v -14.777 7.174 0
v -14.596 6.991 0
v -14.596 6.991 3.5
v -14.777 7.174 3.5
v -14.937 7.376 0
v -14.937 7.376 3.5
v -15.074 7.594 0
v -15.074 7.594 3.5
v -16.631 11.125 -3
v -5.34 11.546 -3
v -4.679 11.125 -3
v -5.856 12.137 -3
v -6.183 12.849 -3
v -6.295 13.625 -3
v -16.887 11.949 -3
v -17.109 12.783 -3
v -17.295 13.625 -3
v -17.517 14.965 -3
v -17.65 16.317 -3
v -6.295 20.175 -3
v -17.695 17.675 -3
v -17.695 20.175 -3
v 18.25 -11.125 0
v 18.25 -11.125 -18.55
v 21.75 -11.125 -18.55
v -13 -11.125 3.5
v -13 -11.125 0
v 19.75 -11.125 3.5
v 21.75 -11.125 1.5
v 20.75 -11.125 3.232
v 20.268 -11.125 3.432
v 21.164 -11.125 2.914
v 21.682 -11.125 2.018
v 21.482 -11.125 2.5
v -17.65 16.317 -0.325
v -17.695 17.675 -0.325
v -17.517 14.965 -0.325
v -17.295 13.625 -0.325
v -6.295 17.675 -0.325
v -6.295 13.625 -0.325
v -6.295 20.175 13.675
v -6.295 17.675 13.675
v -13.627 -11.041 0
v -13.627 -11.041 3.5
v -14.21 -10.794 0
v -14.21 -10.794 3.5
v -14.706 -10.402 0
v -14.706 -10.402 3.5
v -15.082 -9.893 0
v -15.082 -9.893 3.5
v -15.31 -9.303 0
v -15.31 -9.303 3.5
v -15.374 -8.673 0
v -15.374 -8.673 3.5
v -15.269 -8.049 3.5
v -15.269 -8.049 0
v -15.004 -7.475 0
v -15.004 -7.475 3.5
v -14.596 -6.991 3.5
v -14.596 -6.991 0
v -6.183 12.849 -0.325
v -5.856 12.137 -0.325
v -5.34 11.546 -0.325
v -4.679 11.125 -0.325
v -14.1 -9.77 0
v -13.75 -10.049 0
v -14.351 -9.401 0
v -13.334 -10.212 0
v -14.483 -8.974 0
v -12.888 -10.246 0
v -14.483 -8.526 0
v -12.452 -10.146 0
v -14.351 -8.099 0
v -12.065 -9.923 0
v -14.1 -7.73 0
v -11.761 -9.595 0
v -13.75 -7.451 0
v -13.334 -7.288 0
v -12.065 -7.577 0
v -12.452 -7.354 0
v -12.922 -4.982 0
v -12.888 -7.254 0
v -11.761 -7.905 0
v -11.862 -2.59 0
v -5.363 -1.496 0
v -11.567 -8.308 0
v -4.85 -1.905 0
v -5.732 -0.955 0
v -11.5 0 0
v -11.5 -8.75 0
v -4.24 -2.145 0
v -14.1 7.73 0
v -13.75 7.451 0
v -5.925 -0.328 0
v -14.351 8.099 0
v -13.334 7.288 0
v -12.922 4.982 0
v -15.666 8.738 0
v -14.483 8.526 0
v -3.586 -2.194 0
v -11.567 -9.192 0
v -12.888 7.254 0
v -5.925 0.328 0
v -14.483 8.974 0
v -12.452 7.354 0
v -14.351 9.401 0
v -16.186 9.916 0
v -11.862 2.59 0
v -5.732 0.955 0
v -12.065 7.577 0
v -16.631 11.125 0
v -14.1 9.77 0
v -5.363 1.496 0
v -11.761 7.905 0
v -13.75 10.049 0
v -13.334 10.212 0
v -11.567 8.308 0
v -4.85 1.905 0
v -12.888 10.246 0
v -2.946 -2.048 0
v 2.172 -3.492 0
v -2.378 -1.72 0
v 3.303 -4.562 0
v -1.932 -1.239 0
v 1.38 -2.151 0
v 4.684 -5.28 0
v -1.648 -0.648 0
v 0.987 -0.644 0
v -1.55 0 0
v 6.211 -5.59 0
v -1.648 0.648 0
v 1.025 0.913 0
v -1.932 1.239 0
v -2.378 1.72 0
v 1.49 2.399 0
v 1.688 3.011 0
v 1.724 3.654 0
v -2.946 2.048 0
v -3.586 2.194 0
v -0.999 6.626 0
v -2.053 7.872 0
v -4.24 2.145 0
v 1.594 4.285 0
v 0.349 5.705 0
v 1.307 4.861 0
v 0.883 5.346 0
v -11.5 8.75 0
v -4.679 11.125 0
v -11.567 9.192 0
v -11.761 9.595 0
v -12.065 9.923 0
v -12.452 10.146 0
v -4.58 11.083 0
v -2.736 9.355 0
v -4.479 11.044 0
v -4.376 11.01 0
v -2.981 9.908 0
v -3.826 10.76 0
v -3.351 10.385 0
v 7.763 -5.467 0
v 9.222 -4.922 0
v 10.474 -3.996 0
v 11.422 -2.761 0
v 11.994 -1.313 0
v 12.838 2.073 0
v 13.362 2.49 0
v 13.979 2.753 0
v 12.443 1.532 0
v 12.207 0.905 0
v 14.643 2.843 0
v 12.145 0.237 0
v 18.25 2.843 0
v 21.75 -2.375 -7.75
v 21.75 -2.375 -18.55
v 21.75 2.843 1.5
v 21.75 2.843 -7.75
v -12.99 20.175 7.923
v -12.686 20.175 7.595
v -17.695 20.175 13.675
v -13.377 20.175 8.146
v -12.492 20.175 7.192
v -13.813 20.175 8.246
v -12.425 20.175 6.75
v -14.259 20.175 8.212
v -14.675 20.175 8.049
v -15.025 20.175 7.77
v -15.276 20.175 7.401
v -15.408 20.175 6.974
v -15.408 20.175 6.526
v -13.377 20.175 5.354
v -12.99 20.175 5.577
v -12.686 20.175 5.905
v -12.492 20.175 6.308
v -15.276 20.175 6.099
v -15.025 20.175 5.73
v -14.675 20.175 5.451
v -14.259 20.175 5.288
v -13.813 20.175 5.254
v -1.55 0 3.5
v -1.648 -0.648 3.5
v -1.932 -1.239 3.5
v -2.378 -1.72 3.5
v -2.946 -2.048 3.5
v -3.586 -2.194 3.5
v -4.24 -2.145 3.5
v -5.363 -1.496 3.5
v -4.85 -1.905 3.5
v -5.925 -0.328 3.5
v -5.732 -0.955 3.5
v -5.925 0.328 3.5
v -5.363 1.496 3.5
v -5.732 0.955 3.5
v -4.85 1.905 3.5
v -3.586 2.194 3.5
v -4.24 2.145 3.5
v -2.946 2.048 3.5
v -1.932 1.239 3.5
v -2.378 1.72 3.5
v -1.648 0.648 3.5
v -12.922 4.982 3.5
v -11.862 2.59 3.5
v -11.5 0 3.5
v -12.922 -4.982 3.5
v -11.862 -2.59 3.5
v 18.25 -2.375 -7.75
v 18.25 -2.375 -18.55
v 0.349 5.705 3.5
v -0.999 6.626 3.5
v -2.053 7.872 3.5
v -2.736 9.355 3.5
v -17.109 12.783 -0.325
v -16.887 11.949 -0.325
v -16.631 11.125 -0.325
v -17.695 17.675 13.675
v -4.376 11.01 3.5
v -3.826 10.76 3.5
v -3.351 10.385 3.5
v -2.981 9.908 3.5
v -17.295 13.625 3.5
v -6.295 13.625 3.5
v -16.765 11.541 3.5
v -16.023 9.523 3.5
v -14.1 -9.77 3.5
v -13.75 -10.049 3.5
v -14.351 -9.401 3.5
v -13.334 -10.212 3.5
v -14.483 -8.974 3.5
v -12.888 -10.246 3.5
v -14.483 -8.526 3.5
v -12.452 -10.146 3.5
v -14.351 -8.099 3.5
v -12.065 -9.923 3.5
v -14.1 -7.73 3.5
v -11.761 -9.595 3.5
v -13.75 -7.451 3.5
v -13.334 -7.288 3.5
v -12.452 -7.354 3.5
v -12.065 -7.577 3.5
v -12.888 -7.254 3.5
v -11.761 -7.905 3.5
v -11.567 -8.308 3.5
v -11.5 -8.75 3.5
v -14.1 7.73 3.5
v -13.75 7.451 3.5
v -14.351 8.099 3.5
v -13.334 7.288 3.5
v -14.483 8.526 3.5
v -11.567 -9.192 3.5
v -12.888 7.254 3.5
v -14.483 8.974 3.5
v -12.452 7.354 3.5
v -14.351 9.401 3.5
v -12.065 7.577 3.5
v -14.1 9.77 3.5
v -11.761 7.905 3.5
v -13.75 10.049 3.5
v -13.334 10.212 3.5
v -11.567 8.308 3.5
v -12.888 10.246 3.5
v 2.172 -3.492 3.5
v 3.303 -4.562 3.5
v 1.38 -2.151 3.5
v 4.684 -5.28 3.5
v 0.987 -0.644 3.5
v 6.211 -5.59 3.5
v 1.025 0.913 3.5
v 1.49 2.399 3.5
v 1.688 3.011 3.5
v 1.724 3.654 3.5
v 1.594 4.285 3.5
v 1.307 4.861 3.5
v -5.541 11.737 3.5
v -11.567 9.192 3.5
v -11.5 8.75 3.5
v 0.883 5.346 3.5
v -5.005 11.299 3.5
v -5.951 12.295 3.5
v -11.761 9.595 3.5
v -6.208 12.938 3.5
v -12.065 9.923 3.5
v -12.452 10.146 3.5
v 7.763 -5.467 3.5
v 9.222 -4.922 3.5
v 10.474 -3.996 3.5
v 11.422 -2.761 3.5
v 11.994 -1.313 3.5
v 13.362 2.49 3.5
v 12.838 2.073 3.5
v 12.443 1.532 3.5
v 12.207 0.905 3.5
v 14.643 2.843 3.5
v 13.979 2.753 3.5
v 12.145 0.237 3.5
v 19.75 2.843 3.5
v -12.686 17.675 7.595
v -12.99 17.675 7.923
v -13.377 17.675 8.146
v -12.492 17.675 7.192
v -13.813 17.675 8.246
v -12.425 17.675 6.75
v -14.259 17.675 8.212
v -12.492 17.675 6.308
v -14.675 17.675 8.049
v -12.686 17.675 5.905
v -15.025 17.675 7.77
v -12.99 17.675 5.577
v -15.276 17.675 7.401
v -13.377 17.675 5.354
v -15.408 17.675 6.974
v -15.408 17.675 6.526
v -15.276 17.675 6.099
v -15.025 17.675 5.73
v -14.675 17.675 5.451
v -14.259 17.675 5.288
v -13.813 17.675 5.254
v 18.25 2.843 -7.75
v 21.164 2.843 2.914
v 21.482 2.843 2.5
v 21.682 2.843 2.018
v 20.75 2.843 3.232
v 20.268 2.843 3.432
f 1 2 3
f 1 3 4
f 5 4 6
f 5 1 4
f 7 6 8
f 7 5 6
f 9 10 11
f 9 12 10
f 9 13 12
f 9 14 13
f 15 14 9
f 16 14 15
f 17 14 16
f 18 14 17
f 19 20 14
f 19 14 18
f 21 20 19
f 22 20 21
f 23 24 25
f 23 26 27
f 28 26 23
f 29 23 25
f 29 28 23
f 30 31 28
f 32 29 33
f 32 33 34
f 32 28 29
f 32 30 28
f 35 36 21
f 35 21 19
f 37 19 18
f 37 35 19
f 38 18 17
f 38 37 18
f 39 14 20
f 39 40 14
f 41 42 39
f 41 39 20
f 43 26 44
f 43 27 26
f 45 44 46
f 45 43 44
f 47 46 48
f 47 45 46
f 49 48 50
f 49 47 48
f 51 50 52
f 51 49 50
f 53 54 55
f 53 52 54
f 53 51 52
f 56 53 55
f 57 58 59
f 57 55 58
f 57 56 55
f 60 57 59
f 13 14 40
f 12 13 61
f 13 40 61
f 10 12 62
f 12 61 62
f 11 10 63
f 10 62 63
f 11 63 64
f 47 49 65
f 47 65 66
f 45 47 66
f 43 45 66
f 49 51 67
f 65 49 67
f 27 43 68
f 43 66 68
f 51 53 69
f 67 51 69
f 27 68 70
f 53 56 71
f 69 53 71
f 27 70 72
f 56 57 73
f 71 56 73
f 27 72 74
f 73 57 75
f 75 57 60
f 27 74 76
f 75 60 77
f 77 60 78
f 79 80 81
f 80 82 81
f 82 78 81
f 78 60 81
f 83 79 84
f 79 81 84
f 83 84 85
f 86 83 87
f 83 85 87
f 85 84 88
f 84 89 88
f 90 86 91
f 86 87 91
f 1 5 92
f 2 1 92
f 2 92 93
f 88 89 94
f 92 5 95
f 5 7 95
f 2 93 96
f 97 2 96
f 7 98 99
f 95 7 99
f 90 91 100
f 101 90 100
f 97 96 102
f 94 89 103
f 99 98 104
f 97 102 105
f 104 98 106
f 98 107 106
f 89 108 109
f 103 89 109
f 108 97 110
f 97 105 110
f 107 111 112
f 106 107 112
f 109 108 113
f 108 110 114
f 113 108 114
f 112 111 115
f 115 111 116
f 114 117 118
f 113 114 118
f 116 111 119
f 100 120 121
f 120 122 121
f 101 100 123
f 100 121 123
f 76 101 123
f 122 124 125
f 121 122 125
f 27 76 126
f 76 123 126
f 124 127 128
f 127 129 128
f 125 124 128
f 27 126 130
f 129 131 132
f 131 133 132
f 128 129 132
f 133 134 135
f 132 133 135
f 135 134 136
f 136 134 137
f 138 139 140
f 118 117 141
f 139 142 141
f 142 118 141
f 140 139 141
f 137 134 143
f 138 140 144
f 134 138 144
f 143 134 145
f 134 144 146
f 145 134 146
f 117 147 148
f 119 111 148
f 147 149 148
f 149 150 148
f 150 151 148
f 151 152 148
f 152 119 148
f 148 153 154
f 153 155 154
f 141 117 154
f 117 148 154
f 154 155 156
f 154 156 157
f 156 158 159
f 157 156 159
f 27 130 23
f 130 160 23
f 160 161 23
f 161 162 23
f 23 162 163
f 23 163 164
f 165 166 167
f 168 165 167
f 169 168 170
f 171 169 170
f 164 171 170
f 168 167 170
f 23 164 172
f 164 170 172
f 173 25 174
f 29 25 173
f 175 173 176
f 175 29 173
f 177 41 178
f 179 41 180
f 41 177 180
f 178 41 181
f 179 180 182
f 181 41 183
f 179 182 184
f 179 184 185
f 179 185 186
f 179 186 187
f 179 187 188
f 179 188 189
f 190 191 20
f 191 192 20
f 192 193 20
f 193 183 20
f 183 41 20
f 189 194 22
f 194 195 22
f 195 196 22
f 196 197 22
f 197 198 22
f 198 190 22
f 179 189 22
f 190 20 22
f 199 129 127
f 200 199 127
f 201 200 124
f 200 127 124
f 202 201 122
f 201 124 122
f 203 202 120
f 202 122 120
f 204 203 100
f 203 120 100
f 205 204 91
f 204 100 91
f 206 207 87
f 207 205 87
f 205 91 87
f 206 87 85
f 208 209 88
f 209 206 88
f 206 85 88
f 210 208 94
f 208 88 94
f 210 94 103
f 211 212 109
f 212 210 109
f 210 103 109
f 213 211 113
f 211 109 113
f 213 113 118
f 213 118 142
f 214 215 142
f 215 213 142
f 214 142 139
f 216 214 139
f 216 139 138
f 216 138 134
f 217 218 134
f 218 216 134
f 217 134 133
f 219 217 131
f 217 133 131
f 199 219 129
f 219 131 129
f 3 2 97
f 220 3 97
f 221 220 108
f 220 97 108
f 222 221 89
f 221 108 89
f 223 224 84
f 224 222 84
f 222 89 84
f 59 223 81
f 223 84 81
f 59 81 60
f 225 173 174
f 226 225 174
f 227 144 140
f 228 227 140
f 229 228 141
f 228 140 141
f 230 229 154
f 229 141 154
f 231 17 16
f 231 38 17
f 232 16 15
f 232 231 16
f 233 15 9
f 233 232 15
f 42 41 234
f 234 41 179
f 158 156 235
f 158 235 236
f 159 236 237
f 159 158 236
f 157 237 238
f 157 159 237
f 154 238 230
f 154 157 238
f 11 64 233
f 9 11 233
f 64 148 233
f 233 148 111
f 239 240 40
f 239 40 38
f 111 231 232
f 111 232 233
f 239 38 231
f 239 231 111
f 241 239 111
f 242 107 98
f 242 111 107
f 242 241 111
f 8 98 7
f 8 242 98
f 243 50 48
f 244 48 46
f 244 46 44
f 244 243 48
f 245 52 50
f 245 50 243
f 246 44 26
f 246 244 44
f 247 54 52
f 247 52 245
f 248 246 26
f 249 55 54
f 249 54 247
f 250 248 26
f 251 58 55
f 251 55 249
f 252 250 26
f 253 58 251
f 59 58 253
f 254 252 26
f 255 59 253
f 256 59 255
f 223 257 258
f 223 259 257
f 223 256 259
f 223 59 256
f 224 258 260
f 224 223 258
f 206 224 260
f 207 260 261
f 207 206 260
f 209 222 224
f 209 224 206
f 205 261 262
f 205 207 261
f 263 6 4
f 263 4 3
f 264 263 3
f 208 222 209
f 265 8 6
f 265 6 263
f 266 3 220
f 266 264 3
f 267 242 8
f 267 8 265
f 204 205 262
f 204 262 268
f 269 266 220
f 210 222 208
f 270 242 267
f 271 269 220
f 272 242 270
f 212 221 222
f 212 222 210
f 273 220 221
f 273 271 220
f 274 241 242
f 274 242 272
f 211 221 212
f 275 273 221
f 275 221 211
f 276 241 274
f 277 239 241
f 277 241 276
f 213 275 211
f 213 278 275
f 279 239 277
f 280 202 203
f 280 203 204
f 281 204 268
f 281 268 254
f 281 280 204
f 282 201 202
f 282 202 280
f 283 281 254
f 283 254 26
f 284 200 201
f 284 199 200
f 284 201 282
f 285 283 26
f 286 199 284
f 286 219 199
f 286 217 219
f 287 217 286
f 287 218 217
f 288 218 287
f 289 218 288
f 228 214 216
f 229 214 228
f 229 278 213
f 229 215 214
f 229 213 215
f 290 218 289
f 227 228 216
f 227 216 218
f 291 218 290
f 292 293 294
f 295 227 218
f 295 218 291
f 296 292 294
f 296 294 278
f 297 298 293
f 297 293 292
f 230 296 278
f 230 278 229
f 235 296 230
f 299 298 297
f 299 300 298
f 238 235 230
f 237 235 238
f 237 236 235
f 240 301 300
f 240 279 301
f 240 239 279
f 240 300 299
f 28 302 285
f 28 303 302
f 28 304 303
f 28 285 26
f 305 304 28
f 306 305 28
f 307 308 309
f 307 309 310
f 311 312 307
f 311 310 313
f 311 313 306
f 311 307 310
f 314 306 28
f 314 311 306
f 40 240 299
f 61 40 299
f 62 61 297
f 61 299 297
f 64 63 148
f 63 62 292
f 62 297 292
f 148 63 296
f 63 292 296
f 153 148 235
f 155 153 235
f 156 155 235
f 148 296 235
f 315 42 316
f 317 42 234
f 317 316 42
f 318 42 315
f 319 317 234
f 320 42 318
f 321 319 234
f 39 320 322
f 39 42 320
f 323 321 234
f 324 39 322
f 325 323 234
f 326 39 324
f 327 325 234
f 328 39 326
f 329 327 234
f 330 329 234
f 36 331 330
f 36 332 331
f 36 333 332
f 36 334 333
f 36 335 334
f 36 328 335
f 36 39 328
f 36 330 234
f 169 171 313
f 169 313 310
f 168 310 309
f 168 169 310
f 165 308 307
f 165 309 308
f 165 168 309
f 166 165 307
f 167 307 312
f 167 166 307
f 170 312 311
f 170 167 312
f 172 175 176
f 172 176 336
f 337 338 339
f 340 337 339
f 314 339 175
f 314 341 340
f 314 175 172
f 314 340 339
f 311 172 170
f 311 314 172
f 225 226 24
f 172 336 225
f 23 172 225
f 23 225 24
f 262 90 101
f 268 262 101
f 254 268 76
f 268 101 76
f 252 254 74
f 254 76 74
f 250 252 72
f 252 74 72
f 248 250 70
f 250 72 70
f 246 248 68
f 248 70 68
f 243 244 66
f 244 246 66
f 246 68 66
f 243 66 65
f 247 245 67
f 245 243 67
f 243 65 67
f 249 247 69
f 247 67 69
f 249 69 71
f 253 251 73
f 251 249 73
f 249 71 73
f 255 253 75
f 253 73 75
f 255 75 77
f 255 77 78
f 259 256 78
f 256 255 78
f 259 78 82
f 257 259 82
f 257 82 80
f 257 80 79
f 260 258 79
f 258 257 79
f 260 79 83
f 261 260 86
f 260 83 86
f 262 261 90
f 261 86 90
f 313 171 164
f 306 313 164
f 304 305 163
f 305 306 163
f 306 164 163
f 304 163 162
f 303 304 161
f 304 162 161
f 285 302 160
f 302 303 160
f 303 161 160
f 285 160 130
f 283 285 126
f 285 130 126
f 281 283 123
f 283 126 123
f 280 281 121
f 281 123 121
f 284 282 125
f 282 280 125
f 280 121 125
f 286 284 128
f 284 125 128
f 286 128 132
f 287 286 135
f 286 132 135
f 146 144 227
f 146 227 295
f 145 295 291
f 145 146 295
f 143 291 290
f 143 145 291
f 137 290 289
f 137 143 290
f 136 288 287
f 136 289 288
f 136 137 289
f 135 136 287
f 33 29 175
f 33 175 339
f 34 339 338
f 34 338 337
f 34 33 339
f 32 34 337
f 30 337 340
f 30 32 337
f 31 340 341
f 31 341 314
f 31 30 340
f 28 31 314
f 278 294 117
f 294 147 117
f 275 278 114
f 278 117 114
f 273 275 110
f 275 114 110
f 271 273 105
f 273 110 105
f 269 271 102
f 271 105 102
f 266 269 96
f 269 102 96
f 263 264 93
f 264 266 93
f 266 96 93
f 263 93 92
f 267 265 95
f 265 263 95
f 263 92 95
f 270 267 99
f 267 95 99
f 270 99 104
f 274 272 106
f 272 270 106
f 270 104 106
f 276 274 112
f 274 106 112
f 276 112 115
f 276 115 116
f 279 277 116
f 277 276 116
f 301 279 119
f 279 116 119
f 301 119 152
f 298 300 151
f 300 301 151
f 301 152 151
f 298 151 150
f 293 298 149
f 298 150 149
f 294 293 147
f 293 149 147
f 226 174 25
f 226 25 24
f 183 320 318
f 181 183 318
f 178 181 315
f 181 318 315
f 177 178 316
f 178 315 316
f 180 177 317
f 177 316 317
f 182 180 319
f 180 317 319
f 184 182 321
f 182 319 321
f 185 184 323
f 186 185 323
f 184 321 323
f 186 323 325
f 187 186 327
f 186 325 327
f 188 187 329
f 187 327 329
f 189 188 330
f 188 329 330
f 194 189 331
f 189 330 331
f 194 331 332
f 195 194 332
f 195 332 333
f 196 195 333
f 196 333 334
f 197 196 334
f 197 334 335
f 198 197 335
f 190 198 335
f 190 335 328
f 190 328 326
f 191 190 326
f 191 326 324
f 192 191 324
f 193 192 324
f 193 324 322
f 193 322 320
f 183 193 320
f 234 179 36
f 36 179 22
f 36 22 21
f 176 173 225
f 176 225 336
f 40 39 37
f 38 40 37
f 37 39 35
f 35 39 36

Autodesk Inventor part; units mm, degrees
ref_plane "YZ Plane" through (0, 0, 0) normal (1, 0, 0) x (0, 1, 0)
ref_plane "XZ Plane" through (0, 0, 0) normal (0, 1, 0) x (-1, 0, 0)
ref_plane "XY Plane" through (0, 0, 0) normal (0, 0, 1) x (1, 0, 0)
sketch "Sketch1" plane through (0, 0, 0) normal (0, 0, 1) x (1, 0, 0)
  circle A0 centre (-13, 8.75) radius 1.5 projected
  circle A1 centre (-3.75, 0) radius 2 construction
  circle A2 centre (-13, -8.75) radius 1.5 projected
  arc A3 (4.5834, 1.85) -> (4.5834, -1.85) centre (6.55, 0) ccw construction
  arc A4 (4.8736, 5.3432) -> (1.4897, 2.3987) centre (6.55, 0) ccw construction
  circle A5 centre (-3.75, 0) radius 2.2
  arc A6 (-14.5962, -6.9913) -> (-14.5962, 6.9913) centre (-20.9415, 0) ccw
  arc A7 (-13, 11.125) -> (-15.0744, 7.5935) centre (-13, 8.75) ccw construction
  line L0 (14.125, 11.125) -> (-18.25, 11.125) projected
  line L1 (-18.25, -11.125) -> (14.125, -11.125) projected
  arc A8 (-14.5962, -6.9913) -> (-13, -11.125) centre (-13, -8.75) ccw
  line L2 (-11.5, 8.75) -> (-11.5, -8.75) construction
  line L3 (21.75, 2.8432) -> (21.75, -11.125)
  line L4 (21.75, -11.125) -> (14.125, -11.125)
  line L5 (14.125, -11.125) -> (14.125, 11.125) construction
  line L6 (18.25, -7) -> (18.25, 7) construction
  arc A9 (-3, 11.125) -> (-2.7358, 9.3552) centre (3.0597, 11.125) ccw construction
  arc A10 (-2.7358, 9.3552) -> (-4.3762, 11.0097) centre (-5.1268, 8.625) ccw
  arc A11 (-2.7358, 9.3552) -> (0.349, 5.7054) centre (3.0597, 11.125) ccw
  line L7 (11.3745, 2.8432) -> (14.6427, 2.8432) construction
  arc A12 (11.3745, 2.8432) -> (4.8736, 5.3432) centre (6.55, 0) ccw construction
  arc A13 (1.4897, 2.3987) -> (0.349, 5.7054) centre (-0.7693, 3.4695) ccw
  arc A14 (0.349, 5.7054) -> (4.8736, 5.3432) centre (3.0597, 11.125) ccw construction
  arc A15 (1.4897, 2.3987) -> (12.145, 0.2373) centre (6.55, 0) ccw
  arc A16 (14.6427, 2.8432) -> (12.145, 0.2373) centre (14.6427, 0.3432) ccw
  arc A17 (12.145, 0.2373) -> (11.3745, 2.8432) centre (6.55, 0) ccw construction
  line L8 (14.6427, 2.8432) -> (21.75, 2.8432)
  line L9 (-12.425, 16.375) -> (-15.425, 16.375) projected
  line L10 (-15.425, 17.675) -> (-12.425, 17.675) projected
  line L11 (-15.425, 17.675) -> (-17.6949, 17.675)
  line L12 (-12.425, 17.675) -> (-6.2949, 17.675)
  line L13 (-6.2949, 17.675) -> (-6.2949, 20.175)
  line L14 (-6.2949, 20.175) -> (-17.6949, 20.175)
  line L15 (-17.6949, 20.175) -> (-17.6949, 17.675)
  arc A18 (-17.6949, 17.675) -> (-15.0744, 7.5935) centre (3.0083, 17.675) ccw
  line L16 (-6.2949, 13.625) -> (-17.2949, 13.625)
  line L17 (-6.2949, 13.625) -> (-6.2949, 17.675)
  arc A19 (-6.2949, 13.625) -> (-4.3762, 11.0097) centre (-3.553, 13.625) ccw
  arc A20 (-4.3762, 11.0097) -> (-5.1268, 11.125) centre (-5.1268, 8.625) ccw construction
  arc A21 (-15.0744, 7.5935) -> (-14.5962, 6.9913) centre (-13, 8.75) ccw
  point P0 (0, 0)
  point P1 (-4.6789, 11.125)
  point P2 (-16.6314, 11.125)
  dimension "d0" = 0.2
  dimension "d1" = 2.5
  dimension "d3" = 3.5
  dimension "d4" = 10
  dimension "d5" = 2.5
  dimension "d6" = 2.5
  dimension "d7" = 2.5
  dimension "d8" = 2.5
  dimension "d16" = 2.5
  dimension "d17" = 2.5
  dimension "d18" = 11
  dimension "d19" = 11.4
extrude "Extrusion1" add sketch "Sketch1" along normal blind 3.5 contours A6 A21 A18 L0 A19 A10 A11 A13 A15 A16 L8 L3 L4 L1 A8 | A18 L16 A19 L0
sketch "Sketch2" plane through (0, 0, 0) normal (0, 0, -1) x (-1, 0, 0)
  line L0 (-18.25, 7) -> (-18.25, -7) projected
  line L1 (-21.75, -11.125) -> (-21.75, 2.8432) projected
  line L2 (-18.25, -7) -> (-18.25, -11.125)
  line L3 (13, -11.125) -> (-21.75, -11.125) projected
  line L4 (-18.25, -11.125) -> (-21.75, -11.125)
  line L5 (-21.75, 2.8432) -> (-14.6427, 2.8432) projected
  line L6 (-21.75, 2.8432) -> (-18.25, 2.8432)
  point P0 (0, 0)
extrude "Extrusion2" add sketch "Sketch2" along normal blind 18.55
fillet "Fillet1" radius 2 1 edges at (21.75, -4.1409, 3.5)
extrude "Extrusion3" add sketch "Sketch1" against normal blind 0.325 contours A18 L16 A19 L0
sketch "Sketch5" plane through (0, 0, -0.325) normal (0, 0, -1) x (-1, 0, 0)
  line L0 (17.2949, 13.625) -> (6.2949, 13.625) projected
  arc A0 (4.6789, 11.125) -> (6.2949, 13.625) centre (3.553, 13.625) ccw projected
  line L1 (4.6789, 11.125) -> (16.6314, 11.125) projected
  arc A1 (16.6314, 11.125) -> (17.2949, 13.625) centre (-3.0083, 17.675) ccw projected
  line L2 (6.2949, 13.625) -> (6.2949, 17.675) projected
  line L3 (6.2949, 17.675) -> (6.2949, 20.175) projected
  line L4 (6.2949, 20.175) -> (17.6949, 20.175) projected
  line L5 (17.6949, 20.175) -> (17.6949, 17.675) projected
  line L6 (12.425, 17.675) -> (6.2949, 17.675) projected
  line L7 (15.425, 17.675) -> (12.425, 17.675) projected
  line L8 (15.425, 17.675) -> (17.6949, 17.675) projected
  arc A2 (15.0744, 7.5935) -> (17.6949, 17.675) centre (-3.0083, 17.675) ccw projected
  line L9 (6.2949, 13.625) -> (17.2949, 13.625) projected
  point P0 (0, 0)
extrude "Extrusion4" add sketch "Sketch5" along normal blind 2.675
extrude "Extrusion5" add sketch "Sketch5" against normal blind 14 contours L8 L7 L6 L3 L4 L5
sketch "Sketch6" plane through (-17.6949, 17.675, -0.325) normal (0, -1, 0) x (1, 0, 0)
  circle A0 centre (3.7699, 7.075) radius 1.5 projected
  point P0 (17.6949, 0.325)
extrude "Extrusion6" cut sketch "Sketch6" against normal blind 14
sketch "Sketch7" plane through (21.75, -11.125, -18.55) normal (1, 0, 0) x (0, 0, -1)
  line L0 (-10.8, 13.75) -> (-10.8, 8.75) projected
  line L1 (-10.8, 13.75) -> (-10.8, 13.9682)
  line L2 (-18.55, 13.9682) -> (0, 13.9682) projected
  line L3 (-10.8, 8.75) -> (0, 8.75)
  line L4 (0, 0) -> (0, 13.9682) projected
  line L5 (0, 8.75) -> (0, 13.9682)
  point P0 (-18.55, 11.125)
extrude "Extrusion7" cut sketch "Sketch7" against normal blind 10
properties part number "MotorEncoderBracket"
